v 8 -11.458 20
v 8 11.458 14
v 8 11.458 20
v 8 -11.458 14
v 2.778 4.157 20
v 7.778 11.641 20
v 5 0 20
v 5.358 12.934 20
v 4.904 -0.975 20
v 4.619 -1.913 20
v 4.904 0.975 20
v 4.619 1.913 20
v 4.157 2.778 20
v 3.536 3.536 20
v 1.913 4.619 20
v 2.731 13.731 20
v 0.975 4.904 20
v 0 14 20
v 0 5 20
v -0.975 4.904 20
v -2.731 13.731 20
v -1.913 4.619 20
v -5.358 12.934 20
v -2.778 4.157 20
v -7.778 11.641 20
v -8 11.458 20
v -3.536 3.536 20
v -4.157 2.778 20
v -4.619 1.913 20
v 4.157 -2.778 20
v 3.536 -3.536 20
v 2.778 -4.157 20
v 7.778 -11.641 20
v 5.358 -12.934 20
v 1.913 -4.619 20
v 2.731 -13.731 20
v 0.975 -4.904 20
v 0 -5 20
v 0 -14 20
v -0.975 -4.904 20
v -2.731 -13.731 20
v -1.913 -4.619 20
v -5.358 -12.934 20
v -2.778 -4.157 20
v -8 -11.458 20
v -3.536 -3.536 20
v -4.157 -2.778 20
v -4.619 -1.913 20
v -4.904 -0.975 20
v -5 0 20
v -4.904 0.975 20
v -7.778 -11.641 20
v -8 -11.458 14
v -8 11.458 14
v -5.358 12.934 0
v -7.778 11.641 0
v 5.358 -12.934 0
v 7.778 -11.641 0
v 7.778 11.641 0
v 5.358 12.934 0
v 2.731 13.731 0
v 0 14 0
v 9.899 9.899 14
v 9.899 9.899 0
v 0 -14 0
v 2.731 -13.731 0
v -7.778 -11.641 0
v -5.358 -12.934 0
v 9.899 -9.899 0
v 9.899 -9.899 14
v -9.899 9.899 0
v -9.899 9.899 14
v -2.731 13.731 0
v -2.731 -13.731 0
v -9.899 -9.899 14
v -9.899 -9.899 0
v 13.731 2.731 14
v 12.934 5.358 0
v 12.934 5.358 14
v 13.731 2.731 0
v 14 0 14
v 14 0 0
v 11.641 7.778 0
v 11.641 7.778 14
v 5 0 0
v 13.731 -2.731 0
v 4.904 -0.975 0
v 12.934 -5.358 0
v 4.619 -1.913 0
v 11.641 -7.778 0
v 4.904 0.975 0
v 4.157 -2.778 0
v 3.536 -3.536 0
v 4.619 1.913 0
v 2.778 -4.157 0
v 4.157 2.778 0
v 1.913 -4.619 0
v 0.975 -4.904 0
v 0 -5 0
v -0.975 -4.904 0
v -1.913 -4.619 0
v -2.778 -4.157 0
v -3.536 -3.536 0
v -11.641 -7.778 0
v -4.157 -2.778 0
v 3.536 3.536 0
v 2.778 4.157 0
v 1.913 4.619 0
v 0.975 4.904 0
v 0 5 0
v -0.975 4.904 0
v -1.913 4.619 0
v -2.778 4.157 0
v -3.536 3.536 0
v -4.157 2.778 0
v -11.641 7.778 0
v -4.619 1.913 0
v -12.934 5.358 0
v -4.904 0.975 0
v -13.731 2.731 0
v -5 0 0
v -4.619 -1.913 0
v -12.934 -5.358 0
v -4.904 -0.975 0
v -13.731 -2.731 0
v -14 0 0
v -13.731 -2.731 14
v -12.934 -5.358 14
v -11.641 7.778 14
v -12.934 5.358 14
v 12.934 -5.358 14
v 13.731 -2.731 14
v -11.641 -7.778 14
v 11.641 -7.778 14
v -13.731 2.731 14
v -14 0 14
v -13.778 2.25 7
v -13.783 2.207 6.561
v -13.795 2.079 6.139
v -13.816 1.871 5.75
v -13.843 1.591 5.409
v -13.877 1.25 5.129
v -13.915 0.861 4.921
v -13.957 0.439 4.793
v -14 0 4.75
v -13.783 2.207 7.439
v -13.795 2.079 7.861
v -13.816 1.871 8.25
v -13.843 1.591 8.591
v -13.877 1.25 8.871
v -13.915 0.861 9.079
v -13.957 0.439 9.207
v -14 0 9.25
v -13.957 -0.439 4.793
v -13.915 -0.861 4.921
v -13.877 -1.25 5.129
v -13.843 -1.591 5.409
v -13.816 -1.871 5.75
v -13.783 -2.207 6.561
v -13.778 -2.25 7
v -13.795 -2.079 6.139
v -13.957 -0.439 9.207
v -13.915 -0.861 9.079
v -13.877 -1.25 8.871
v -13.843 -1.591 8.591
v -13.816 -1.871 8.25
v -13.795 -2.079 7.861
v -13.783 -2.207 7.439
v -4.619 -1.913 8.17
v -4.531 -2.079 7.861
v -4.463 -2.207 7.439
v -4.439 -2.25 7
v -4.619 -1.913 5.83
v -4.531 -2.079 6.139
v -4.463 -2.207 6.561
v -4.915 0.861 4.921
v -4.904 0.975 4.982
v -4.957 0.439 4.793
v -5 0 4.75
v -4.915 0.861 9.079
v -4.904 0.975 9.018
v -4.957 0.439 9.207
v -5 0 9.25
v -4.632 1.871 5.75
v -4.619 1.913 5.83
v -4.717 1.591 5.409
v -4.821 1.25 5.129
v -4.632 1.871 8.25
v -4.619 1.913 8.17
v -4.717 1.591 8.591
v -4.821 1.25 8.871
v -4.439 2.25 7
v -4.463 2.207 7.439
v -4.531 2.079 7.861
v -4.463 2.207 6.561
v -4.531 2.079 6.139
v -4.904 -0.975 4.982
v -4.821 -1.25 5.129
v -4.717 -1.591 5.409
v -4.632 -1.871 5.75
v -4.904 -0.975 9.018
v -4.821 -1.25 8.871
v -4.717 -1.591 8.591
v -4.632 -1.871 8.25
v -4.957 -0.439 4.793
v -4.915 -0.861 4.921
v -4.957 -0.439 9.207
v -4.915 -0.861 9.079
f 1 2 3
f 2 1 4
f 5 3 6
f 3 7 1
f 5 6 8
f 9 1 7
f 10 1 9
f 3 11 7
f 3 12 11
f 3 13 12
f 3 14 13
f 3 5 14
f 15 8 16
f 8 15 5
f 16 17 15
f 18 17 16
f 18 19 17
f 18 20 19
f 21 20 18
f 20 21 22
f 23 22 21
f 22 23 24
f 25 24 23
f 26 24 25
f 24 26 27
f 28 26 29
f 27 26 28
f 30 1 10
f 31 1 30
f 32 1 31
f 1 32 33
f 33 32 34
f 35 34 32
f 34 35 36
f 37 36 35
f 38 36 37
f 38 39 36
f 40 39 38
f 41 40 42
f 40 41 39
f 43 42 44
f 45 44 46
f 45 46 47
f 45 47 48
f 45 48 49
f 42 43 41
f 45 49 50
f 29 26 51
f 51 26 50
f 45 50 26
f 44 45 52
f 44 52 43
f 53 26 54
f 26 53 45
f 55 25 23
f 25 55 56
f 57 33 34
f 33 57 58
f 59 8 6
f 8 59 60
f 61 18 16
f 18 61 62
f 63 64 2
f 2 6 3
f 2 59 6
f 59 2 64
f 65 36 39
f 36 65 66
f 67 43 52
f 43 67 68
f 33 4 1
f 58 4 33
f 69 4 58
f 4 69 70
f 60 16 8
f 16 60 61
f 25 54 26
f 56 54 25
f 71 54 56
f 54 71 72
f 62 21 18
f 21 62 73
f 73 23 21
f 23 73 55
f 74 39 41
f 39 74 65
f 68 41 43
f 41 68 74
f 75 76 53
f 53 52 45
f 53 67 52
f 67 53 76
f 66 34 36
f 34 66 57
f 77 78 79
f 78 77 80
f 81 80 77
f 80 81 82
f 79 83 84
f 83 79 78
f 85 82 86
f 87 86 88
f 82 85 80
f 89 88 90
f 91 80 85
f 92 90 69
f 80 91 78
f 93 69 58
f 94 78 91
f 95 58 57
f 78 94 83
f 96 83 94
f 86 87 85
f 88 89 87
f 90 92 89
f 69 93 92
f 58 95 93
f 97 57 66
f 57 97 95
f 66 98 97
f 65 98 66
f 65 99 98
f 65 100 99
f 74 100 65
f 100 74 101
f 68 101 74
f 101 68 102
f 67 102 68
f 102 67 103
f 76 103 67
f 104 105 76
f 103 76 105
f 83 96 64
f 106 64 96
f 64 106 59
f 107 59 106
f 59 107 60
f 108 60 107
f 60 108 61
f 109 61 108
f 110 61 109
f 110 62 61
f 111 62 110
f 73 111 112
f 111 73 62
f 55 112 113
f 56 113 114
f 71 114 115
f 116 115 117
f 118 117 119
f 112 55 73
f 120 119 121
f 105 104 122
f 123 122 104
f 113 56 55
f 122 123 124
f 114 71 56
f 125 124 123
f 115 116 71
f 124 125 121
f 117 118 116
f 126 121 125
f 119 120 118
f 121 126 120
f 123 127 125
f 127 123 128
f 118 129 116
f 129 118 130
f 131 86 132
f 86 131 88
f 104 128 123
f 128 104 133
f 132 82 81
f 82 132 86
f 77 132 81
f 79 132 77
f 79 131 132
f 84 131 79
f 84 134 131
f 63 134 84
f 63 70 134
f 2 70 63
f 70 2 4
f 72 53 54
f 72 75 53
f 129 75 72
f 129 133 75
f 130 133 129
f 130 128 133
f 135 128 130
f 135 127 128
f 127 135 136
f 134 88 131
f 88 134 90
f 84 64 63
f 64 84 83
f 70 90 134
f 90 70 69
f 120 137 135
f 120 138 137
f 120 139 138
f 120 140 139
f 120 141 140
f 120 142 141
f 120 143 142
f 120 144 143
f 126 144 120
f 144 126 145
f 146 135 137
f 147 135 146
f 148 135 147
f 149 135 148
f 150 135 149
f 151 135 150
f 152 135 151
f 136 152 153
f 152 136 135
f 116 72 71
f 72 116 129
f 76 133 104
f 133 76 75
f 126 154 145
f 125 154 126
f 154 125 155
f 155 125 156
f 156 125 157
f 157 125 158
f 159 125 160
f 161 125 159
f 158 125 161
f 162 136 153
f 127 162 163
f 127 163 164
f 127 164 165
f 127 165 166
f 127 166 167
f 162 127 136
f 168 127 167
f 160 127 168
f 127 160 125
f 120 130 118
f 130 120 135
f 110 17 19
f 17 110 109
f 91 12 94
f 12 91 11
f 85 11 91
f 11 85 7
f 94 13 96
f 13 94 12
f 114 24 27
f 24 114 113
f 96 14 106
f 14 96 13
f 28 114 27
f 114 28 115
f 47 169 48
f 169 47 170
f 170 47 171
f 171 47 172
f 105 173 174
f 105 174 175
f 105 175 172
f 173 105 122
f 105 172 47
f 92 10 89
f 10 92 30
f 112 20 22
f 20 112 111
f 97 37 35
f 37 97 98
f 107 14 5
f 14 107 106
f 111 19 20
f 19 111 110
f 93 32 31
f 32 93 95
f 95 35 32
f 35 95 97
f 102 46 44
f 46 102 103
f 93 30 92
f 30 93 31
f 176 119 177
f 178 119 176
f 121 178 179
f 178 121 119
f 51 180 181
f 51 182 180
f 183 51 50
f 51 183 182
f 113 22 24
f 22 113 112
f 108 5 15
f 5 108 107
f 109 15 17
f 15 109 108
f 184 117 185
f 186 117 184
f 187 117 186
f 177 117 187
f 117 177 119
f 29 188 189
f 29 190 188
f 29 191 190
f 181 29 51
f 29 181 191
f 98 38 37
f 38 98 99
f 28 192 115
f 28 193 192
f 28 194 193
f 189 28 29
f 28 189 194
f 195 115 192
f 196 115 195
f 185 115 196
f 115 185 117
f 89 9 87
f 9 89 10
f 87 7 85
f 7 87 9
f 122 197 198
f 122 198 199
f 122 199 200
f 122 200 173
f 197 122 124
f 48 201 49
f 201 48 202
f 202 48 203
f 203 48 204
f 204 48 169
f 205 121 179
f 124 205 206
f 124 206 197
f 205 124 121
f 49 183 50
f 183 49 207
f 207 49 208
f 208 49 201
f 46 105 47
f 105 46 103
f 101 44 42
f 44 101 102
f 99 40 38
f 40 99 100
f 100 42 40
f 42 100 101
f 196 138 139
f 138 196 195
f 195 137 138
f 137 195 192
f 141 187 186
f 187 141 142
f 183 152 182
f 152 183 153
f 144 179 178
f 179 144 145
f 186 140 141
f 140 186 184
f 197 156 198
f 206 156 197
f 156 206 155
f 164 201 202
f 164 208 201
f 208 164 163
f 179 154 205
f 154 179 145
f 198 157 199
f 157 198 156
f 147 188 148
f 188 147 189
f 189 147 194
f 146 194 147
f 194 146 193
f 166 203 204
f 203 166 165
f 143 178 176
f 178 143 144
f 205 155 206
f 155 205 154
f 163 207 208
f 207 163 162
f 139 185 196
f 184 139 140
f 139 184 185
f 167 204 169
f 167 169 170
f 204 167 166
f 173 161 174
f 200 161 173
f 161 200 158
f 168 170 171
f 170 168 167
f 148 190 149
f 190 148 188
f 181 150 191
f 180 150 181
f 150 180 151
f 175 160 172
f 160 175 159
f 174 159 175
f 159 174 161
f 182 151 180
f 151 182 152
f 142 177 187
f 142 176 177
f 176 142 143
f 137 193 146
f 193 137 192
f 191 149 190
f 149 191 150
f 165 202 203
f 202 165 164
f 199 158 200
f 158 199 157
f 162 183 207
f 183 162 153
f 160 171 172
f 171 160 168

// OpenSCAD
$fn = 32;

// ----------------------------------------------------------------------
// Oldham coupling hub: 28 x 20 mm
// ----------------------------------------------------------------------

// --- parameters (mm) ---
hub_d = 28;               // hub diameter
hub_l = 14;               // hub length
bore_d = 10;              // shaft bore
tongue_w = 16;            // drive tongue width
tongue_h = 6;             // drive tongue height
set_d = 4.5;              // set screw tap hole

module hub() {
  cylinder(h = hub_l, d = hub_d);
  /* tongue, clipped to the hub disc and sunk 1 mm into the face */
  intersection() {
    translate([-tongue_w / 2, -hub_d / 2, hub_l - 1])
      cube([tongue_w, hub_d, tongue_h + 1]);
    translate([0, 0, hub_l - 1]) cylinder(h = tongue_h + 1, d = hub_d);
  }
}

difference() {
  hub();
  translate([0, 0, -1]) cylinder(h = hub_l + tongue_h + 2, d = bore_d);
  translate([-hub_d / 2 - 1, 0, hub_l * 0.5])
    rotate([0, 90, 0]) cylinder(h = hub_d / 2 + 2, d = set_d);
}
